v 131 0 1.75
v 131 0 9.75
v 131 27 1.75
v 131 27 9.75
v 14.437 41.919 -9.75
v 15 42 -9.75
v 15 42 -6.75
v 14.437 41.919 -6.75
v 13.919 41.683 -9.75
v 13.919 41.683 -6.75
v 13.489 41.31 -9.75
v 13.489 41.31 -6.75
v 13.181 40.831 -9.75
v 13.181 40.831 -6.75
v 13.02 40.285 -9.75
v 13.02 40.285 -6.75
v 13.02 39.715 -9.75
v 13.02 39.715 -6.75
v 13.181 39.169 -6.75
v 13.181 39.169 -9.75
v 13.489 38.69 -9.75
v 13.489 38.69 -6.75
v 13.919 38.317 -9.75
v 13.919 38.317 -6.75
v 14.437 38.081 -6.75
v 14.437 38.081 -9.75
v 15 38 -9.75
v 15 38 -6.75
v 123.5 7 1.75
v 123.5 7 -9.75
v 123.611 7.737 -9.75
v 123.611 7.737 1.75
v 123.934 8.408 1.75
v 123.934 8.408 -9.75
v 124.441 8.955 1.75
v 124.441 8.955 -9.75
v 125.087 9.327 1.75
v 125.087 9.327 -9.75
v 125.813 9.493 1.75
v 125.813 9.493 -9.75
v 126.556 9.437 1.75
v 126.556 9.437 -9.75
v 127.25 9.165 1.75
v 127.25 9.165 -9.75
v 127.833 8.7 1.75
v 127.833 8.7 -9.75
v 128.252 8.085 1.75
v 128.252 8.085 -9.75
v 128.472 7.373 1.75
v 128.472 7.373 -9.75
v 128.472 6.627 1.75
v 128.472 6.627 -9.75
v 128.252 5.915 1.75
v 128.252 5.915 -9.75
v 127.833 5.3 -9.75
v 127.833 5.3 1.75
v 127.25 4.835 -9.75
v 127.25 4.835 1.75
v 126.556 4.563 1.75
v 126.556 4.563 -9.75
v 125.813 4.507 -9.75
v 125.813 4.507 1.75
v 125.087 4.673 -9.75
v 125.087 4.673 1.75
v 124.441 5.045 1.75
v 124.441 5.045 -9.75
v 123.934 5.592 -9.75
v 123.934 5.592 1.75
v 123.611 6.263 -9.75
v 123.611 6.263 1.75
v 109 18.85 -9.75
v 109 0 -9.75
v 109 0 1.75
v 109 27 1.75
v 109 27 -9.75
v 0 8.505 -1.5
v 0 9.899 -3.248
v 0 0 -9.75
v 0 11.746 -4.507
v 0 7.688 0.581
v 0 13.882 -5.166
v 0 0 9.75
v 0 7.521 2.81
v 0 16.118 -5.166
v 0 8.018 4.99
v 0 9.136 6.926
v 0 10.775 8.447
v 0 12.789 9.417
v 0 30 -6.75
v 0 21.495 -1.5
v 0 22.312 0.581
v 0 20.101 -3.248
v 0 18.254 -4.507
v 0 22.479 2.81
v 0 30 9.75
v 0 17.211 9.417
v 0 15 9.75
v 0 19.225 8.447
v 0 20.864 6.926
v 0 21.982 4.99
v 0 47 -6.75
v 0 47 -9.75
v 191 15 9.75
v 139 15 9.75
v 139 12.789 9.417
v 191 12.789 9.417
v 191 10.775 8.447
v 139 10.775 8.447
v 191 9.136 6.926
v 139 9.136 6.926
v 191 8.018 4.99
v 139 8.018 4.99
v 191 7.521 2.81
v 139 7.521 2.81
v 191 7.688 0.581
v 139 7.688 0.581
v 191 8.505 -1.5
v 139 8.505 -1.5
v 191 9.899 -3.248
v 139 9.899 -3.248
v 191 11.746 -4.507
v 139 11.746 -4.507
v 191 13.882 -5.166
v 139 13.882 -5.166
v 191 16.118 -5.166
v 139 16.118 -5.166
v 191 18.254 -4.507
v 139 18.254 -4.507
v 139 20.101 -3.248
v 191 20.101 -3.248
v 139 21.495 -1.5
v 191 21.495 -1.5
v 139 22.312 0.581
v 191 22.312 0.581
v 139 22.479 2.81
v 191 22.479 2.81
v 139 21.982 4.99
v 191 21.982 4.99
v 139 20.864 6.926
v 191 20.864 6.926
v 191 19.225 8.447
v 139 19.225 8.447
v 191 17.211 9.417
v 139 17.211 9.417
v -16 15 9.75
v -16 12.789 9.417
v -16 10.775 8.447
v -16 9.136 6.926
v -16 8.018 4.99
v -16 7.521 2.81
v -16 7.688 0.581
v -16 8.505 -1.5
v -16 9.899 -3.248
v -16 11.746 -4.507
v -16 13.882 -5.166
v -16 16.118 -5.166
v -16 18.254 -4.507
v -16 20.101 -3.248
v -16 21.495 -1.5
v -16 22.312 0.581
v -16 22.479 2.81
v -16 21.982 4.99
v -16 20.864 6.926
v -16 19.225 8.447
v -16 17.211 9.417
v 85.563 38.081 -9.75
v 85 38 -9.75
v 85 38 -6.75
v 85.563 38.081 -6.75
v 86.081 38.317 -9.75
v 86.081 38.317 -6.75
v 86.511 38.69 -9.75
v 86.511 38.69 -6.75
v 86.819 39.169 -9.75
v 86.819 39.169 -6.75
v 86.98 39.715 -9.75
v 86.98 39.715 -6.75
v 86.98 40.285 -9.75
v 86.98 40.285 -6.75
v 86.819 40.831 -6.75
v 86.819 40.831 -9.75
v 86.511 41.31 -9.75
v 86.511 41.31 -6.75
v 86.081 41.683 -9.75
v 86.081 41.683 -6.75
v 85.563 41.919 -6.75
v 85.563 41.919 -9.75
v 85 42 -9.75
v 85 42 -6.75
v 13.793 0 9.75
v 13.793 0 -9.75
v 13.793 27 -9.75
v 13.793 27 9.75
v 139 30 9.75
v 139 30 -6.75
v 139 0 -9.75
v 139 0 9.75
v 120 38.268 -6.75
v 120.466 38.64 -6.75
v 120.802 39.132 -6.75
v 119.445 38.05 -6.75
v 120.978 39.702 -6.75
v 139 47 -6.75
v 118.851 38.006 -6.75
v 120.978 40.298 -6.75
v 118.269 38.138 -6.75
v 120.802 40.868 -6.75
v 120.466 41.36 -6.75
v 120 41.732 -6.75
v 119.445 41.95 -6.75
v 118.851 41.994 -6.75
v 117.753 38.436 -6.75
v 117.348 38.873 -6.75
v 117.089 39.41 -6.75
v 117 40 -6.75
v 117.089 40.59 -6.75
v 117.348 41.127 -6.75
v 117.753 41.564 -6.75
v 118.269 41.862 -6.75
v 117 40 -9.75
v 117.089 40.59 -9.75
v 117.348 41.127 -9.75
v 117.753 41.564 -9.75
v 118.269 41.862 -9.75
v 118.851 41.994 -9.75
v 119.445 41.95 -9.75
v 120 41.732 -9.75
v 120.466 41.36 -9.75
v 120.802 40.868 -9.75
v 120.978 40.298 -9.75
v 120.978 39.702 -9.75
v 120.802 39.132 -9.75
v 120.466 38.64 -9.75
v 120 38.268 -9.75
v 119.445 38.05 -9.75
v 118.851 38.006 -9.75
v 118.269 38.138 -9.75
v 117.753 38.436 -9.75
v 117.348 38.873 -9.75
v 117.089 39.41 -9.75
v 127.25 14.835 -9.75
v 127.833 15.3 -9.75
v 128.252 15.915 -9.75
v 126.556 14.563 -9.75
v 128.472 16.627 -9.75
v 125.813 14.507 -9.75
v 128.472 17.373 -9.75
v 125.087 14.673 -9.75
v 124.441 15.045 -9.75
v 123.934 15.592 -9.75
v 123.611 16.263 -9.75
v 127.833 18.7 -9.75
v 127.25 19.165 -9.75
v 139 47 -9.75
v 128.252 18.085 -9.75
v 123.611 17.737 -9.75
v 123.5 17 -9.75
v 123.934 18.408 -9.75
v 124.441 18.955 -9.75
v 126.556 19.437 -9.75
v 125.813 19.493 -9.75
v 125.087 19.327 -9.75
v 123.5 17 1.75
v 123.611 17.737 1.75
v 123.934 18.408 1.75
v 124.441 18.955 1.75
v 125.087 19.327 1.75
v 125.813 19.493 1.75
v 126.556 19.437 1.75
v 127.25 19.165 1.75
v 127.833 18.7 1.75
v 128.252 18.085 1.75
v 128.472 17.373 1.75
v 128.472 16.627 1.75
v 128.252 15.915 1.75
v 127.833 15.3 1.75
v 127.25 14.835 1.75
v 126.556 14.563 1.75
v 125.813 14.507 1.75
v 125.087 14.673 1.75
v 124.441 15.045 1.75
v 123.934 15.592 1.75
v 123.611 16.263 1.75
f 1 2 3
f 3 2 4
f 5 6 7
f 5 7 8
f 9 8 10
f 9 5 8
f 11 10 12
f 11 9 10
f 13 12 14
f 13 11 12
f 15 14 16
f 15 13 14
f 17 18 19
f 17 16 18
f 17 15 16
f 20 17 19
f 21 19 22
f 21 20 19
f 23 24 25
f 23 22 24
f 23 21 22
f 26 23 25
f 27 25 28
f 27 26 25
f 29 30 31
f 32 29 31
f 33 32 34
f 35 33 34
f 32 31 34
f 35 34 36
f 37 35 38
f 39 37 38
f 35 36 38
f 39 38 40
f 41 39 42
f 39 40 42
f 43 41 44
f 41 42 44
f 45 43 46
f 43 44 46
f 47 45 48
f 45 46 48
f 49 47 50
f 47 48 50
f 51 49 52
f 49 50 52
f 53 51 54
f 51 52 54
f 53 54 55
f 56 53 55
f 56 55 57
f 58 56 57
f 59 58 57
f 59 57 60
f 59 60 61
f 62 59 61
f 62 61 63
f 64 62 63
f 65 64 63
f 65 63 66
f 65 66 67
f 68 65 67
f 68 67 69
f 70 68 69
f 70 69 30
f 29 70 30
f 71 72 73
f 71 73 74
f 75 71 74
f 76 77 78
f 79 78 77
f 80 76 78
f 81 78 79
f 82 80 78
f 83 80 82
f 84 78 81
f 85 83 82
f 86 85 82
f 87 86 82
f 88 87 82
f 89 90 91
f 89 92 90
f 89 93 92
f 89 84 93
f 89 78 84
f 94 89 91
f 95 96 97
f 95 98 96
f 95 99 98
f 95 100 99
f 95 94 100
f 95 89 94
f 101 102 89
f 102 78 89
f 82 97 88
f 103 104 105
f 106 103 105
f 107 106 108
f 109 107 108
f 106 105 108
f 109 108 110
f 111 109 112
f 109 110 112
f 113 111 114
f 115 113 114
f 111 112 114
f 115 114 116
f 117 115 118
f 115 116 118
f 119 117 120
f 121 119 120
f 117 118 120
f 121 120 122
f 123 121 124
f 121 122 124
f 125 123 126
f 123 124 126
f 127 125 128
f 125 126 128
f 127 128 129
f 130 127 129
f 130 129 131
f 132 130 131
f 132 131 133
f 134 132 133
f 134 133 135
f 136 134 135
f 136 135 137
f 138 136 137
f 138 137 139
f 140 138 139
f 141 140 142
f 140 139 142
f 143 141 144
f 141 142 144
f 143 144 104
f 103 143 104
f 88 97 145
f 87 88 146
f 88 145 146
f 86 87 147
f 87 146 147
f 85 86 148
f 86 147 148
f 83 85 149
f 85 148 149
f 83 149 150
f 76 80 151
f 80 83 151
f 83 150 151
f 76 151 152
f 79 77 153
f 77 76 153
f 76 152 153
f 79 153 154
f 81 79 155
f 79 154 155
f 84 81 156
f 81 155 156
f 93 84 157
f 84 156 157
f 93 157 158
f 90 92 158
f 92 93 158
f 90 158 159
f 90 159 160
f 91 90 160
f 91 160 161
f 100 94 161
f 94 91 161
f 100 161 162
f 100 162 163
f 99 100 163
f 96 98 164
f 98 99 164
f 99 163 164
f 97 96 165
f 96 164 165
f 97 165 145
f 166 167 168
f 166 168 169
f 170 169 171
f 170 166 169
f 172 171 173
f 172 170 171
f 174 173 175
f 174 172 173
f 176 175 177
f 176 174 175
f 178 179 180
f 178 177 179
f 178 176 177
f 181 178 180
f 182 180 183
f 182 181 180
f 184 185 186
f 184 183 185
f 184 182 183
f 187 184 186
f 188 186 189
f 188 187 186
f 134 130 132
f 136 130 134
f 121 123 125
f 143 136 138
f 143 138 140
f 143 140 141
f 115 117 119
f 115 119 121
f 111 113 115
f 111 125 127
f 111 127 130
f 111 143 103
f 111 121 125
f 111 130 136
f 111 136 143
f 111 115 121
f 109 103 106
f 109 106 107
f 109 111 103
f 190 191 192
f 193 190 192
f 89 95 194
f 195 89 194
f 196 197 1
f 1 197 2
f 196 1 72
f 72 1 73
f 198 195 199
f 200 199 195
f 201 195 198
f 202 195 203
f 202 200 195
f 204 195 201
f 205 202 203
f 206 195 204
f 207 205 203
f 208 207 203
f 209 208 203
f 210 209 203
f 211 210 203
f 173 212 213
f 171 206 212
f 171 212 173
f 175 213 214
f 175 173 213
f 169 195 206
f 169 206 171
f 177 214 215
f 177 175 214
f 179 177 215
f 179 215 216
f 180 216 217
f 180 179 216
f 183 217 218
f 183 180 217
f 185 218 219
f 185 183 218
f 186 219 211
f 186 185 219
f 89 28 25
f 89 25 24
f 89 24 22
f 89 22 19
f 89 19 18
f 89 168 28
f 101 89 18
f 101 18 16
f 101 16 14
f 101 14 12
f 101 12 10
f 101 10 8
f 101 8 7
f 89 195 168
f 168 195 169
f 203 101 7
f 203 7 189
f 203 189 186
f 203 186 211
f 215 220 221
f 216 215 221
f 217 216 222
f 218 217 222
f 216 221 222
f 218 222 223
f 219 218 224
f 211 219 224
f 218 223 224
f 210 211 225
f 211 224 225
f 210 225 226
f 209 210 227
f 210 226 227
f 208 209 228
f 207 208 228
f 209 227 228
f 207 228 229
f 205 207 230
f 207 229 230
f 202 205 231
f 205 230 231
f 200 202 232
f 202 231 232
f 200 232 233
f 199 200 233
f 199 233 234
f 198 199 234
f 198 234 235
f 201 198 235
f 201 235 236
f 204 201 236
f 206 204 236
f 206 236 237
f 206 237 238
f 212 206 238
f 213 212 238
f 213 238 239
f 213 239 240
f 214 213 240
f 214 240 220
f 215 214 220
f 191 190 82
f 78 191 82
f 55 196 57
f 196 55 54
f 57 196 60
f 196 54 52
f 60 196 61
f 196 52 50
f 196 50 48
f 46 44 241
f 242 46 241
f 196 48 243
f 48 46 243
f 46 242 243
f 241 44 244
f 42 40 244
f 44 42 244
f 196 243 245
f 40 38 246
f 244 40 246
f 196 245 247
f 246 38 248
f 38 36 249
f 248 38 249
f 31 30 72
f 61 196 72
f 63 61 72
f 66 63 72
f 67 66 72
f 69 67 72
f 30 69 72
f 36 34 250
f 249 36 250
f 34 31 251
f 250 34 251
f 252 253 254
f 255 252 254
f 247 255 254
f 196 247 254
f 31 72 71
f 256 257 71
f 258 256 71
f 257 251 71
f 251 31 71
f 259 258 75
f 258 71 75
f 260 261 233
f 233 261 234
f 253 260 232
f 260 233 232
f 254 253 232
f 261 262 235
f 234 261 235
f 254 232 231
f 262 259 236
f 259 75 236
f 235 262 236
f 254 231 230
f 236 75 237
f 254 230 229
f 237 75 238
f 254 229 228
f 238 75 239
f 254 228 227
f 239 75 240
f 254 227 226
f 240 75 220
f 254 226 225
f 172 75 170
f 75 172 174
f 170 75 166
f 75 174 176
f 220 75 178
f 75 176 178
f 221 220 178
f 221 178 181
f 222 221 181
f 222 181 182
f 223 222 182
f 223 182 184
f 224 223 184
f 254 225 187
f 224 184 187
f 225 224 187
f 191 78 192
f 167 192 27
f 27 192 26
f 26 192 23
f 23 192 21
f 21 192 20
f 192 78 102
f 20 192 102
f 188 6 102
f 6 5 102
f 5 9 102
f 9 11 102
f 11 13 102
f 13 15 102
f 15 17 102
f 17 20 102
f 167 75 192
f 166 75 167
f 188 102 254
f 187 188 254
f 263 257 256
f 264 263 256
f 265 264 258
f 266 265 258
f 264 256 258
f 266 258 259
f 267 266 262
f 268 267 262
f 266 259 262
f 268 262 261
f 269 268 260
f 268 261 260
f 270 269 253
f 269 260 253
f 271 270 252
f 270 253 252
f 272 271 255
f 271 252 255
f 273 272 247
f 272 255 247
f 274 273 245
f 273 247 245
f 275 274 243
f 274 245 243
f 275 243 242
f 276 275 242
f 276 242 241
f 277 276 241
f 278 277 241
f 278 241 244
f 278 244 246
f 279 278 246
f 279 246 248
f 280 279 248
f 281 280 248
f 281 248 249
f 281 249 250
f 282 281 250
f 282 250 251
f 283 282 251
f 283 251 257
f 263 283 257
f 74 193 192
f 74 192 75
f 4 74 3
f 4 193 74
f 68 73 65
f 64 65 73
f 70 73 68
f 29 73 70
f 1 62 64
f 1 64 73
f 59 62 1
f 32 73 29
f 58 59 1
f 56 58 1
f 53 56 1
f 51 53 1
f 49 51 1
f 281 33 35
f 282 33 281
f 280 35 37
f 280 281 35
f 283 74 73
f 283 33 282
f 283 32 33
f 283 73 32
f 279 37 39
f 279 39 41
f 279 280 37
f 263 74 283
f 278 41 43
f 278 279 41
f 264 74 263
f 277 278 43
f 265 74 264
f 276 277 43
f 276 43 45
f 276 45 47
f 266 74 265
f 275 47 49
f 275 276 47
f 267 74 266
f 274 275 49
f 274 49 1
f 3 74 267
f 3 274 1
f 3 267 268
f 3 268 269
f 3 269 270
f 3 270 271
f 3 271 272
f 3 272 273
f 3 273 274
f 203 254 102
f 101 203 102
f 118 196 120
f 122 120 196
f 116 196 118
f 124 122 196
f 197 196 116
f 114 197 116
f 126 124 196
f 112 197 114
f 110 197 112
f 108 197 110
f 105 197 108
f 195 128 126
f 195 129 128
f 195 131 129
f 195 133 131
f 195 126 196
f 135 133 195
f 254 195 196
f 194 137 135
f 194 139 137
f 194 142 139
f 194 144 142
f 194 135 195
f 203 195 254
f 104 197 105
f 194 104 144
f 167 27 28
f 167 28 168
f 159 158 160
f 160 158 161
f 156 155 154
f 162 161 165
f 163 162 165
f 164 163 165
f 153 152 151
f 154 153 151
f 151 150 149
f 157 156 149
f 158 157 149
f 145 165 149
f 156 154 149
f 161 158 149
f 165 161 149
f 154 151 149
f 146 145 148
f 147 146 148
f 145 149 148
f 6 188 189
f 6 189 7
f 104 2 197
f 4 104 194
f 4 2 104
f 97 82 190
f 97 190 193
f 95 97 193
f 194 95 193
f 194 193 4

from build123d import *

# Parameters (mm, degrees)
BOSS_EXTRUDE1_DEPTH     = 139
SKETCH3_R               = 2
CUT_EXTRUDE1_DEPTH      = 153.647469681
SKETCH5_W               = 30
SKETCH5_H               = 60
BOSS_EXTRUDE2_DEPTH     = 13.7
SKETCH6_W               = 27.582278357
SKETCH6_H               = 4.25
SKETCH6_W_2             = 27.382278357
BOSS_EXTRUDE3_DEPTH     = 10
CUT_EXTRUDE3_DEPTH      = 132.062650228
CUT_EXTRUDE3_DEPTH_BACK = 132.062650228
SKETCH7_R               = 1
SKETCH4_R               = 7.5
BOSS_EXTRUDE4_DEPTH     = 52
BOSS_EXTRUDE5_START     = -155
SKETCH4_2_R             = 7.5
BOSS_EXTRUDE5_DEPTH     = 155
SKETCH8_W               = 30
SKETCH8_H               = 13.7
CUT_EXTRUDE4_DEPTH      = 18.85
SKETCH9_W               = 95.207004137
SKETCH9_H               = 27
CUT_EXTRUDE5_DEPTH      = 202.60032242
SKETCH10_W              = 139
SKETCH10_H              = 30
CUT_EXTRUDE6_DEPTH      = 16.5
CUT_EXTRUDE7_DEPTH      = 203.936541806
CUT_EXTRUDE7_DEPTH_BACK = 13.7
SKETCH11_W              = 30
SKETCH11_H              = 45.211643816
SKETCH12_W              = 139
SKETCH12_H              = 13
CUT_EXTRUDE8_DEPTH      = 202.149819786
CUT_EXTRUDE9_REACH      = 199.662
SKETCH13_R              = 2.5
SKETCH14_W              = 22
SKETCH14_H              = 27
CUT_EXTRUDE10_DEPTH     = 8


with BuildPart() as part:
    # Sketch2 → Boss-Extrude1 (new body)
    with BuildSketch(Plane(origin=(0, 0, 0), x_dir=(0, 0, -1), z_dir=(1, 0, 0))):
        Polygon((-6.75, 30), (6.75, 30), (6.75, 60), (9.75, 60), (9.75, 51.134717436), (9.75, 0), (-9.75, 0), (-9.75, 60), (-6.75, 60), align=None)
    extrude(amount=BOSS_EXTRUDE1_DEPTH)

    # Sketch3 → Cut-Extrude1 (cut, through all)
    with BuildSketch(Plane(origin=(0, 0, -9.75), x_dir=(-1, 0, 0), z_dir=(0, 0, -1))):
        with Locations((-119, 40)):
            Circle(SKETCH3_R)
        with BuildLine():
            Line((-85, 42), (-15, 42))
            ThreePointArc((-15, 42), (-13, 40), (-15, 38))
            Line((-15, 38), (-85, 38))
            ThreePointArc((-85, 38), (-87, 40), (-85, 42))
        make_face()
    extrude(amount=-CUT_EXTRUDE1_DEPTH, mode=Mode.SUBTRACT)

    # Sketch5 → Boss-Extrude2 (add)
    with BuildSketch(Plane(origin=(0, 0, -9.75), x_dir=(-1, 0, 0), z_dir=(0, 0, -1))):
        with Locations((-124, 30)):
            Rectangle(SKETCH5_W, SKETCH5_H)
    extrude(amount=BOSS_EXTRUDE2_DEPTH)

    # Sketch6 → Boss-Extrude3 (add)
    with BuildSketch(Plane(origin=(0, 0, -23.45), x_dir=(-1, 0, 0), z_dir=(0, 0, -1))):
        with Locations((-125.208860821, 20.975)):
            Rectangle(SKETCH6_W, SKETCH6_H)
        with Locations((-125.308860822, 48.775)):
            Rectangle(SKETCH6_W_2, SKETCH6_H)
    extrude(amount=BOSS_EXTRUDE3_DEPTH)

    # Sketch7 → Cut-Extrude3 (cut, two sides: drawn at the far end of the back side and taken through both)
    with BuildSketch(Plane.ZY.offset(-111.617721643).offset(-CUT_EXTRUDE3_DEPTH_BACK)):
        with Locations((-30.95, 48.78)):
            Circle(SKETCH7_R)
        with Locations((-30.95, 20.97)):
            Circle(SKETCH7_R)
    extrude(amount=CUT_EXTRUDE3_DEPTH + CUT_EXTRUDE3_DEPTH_BACK, mode=Mode.SUBTRACT)

    # Sketch4 → Boss-Extrude4 (add)
    with BuildSketch(Plane(origin=(139, 0, 0), x_dir=(0, 0, -1), z_dir=(1, 0, 0))):
        with Locations(Location((-2.25, 15, 0), (0, 0, 180))):
            Circle(SKETCH4_R)
    extrude(amount=BOSS_EXTRUDE4_DEPTH)

    # Sketch4<2> → Boss-Extrude5 (add)
    with BuildSketch(Plane(origin=(139, 0, 0), x_dir=(0, 0, -1), z_dir=(1, 0, 0)).offset(BOSS_EXTRUDE5_START)):
        with Locations(Location((-2.25, 15, 0), (0, 0, 180))):
            Circle(SKETCH4_2_R)
    extrude(amount=BOSS_EXTRUDE5_DEPTH)

    # Sketch8 → Cut-Extrude4 (cut)
    with BuildSketch(Plane.XZ):
        with Locations((124, -16.6)):
            Rectangle(SKETCH8_W, SKETCH8_H)
    extrude(amount=-CUT_EXTRUDE4_DEPTH, mode=Mode.SUBTRACT)

    # Sketch9 → Cut-Extrude5 (cut, through all)
    with BuildSketch(Plane(origin=(0, 0, -9.75), x_dir=(-1, 0, 0), z_dir=(0, 0, -1))):
        with Locations((-61.396497932, 13.5)):
            Rectangle(SKETCH9_W, SKETCH9_H)
    extrude(amount=-CUT_EXTRUDE5_DEPTH, mode=Mode.SUBTRACT)

    # Sketch10 → Cut-Extrude6 (cut)
    with BuildSketch(Plane.XY.offset(9.75)):
        with Locations((69.5, 45)):
            Rectangle(SKETCH10_W, SKETCH10_H)
    extrude(amount=-CUT_EXTRUDE6_DEPTH, mode=Mode.SUBTRACT)

    # Sketch11 → Cut-Extrude7 (cut, two sides: drawn at the far end of the back side and taken through both)
    with BuildSketch(Plane(origin=(0, 0, -23.45), x_dir=(-1, 0, 0), z_dir=(0, 0, -1)).offset(-CUT_EXTRUDE7_DEPTH_BACK)):
        with Locations((-124, 37.394178092)):
            Rectangle(SKETCH11_W, SKETCH11_H)
    extrude(amount=CUT_EXTRUDE7_DEPTH + CUT_EXTRUDE7_DEPTH_BACK, mode=Mode.SUBTRACT)

    # Sketch12 → Cut-Extrude8 (cut, through all)
    with BuildSketch(Plane(origin=(0, 0, -9.75), x_dir=(-1, 0, 0), z_dir=(0, 0, -1))):
        with Locations((-69.5, 53.5)):
            Rectangle(SKETCH12_W, SKETCH12_H)
    extrude(amount=-CUT_EXTRUDE8_DEPTH, mode=Mode.SUBTRACT)

    # Sketch13 → Cut-Extrude9 (cut, up to next)
    with BuildSketch(Plane(origin=(0, 0, -9.75), x_dir=(-1, 0, 0), z_dir=(0, 0, -1)), mode=Mode.PRIVATE) as cut_extrude9_sk1:
        with Locations((-126, 7)):
            Circle(SKETCH13_R)
    cut_extrude9_tool1 = extrude(cut_extrude9_sk1.sketch, amount=-CUT_EXTRUDE9_REACH, mode=Mode.PRIVATE) & part.part
    # Sketch13 → Cut-Extrude9 (cut, up to next)
    with BuildSketch(Plane(origin=(0, 0, -9.75), x_dir=(-1, 0, 0), z_dir=(0, 0, -1)), mode=Mode.PRIVATE) as cut_extrude9_sk2:
        with Locations((-126, 17)):
            Circle(SKETCH13_R)
    cut_extrude9_tool2 = extrude(cut_extrude9_sk2.sketch, amount=-CUT_EXTRUDE9_REACH, mode=Mode.PRIVATE) & part.part
    add(cut_extrude9_tool1.solids().sort_by_distance((126, 7, -9.75))[0], mode=Mode.SUBTRACT)
    add(cut_extrude9_tool2.solids().sort_by_distance((126, 17, -9.75))[0], mode=Mode.SUBTRACT)

    # Sketch14 → Cut-Extrude10 (cut)
    with BuildSketch(Plane.XY.offset(9.75)):
        with Locations((120, 13.5)):
            Rectangle(SKETCH14_W, SKETCH14_H)
    extrude(amount=-CUT_EXTRUDE10_DEPTH, mode=Mode.SUBTRACT)


solid = part.part
